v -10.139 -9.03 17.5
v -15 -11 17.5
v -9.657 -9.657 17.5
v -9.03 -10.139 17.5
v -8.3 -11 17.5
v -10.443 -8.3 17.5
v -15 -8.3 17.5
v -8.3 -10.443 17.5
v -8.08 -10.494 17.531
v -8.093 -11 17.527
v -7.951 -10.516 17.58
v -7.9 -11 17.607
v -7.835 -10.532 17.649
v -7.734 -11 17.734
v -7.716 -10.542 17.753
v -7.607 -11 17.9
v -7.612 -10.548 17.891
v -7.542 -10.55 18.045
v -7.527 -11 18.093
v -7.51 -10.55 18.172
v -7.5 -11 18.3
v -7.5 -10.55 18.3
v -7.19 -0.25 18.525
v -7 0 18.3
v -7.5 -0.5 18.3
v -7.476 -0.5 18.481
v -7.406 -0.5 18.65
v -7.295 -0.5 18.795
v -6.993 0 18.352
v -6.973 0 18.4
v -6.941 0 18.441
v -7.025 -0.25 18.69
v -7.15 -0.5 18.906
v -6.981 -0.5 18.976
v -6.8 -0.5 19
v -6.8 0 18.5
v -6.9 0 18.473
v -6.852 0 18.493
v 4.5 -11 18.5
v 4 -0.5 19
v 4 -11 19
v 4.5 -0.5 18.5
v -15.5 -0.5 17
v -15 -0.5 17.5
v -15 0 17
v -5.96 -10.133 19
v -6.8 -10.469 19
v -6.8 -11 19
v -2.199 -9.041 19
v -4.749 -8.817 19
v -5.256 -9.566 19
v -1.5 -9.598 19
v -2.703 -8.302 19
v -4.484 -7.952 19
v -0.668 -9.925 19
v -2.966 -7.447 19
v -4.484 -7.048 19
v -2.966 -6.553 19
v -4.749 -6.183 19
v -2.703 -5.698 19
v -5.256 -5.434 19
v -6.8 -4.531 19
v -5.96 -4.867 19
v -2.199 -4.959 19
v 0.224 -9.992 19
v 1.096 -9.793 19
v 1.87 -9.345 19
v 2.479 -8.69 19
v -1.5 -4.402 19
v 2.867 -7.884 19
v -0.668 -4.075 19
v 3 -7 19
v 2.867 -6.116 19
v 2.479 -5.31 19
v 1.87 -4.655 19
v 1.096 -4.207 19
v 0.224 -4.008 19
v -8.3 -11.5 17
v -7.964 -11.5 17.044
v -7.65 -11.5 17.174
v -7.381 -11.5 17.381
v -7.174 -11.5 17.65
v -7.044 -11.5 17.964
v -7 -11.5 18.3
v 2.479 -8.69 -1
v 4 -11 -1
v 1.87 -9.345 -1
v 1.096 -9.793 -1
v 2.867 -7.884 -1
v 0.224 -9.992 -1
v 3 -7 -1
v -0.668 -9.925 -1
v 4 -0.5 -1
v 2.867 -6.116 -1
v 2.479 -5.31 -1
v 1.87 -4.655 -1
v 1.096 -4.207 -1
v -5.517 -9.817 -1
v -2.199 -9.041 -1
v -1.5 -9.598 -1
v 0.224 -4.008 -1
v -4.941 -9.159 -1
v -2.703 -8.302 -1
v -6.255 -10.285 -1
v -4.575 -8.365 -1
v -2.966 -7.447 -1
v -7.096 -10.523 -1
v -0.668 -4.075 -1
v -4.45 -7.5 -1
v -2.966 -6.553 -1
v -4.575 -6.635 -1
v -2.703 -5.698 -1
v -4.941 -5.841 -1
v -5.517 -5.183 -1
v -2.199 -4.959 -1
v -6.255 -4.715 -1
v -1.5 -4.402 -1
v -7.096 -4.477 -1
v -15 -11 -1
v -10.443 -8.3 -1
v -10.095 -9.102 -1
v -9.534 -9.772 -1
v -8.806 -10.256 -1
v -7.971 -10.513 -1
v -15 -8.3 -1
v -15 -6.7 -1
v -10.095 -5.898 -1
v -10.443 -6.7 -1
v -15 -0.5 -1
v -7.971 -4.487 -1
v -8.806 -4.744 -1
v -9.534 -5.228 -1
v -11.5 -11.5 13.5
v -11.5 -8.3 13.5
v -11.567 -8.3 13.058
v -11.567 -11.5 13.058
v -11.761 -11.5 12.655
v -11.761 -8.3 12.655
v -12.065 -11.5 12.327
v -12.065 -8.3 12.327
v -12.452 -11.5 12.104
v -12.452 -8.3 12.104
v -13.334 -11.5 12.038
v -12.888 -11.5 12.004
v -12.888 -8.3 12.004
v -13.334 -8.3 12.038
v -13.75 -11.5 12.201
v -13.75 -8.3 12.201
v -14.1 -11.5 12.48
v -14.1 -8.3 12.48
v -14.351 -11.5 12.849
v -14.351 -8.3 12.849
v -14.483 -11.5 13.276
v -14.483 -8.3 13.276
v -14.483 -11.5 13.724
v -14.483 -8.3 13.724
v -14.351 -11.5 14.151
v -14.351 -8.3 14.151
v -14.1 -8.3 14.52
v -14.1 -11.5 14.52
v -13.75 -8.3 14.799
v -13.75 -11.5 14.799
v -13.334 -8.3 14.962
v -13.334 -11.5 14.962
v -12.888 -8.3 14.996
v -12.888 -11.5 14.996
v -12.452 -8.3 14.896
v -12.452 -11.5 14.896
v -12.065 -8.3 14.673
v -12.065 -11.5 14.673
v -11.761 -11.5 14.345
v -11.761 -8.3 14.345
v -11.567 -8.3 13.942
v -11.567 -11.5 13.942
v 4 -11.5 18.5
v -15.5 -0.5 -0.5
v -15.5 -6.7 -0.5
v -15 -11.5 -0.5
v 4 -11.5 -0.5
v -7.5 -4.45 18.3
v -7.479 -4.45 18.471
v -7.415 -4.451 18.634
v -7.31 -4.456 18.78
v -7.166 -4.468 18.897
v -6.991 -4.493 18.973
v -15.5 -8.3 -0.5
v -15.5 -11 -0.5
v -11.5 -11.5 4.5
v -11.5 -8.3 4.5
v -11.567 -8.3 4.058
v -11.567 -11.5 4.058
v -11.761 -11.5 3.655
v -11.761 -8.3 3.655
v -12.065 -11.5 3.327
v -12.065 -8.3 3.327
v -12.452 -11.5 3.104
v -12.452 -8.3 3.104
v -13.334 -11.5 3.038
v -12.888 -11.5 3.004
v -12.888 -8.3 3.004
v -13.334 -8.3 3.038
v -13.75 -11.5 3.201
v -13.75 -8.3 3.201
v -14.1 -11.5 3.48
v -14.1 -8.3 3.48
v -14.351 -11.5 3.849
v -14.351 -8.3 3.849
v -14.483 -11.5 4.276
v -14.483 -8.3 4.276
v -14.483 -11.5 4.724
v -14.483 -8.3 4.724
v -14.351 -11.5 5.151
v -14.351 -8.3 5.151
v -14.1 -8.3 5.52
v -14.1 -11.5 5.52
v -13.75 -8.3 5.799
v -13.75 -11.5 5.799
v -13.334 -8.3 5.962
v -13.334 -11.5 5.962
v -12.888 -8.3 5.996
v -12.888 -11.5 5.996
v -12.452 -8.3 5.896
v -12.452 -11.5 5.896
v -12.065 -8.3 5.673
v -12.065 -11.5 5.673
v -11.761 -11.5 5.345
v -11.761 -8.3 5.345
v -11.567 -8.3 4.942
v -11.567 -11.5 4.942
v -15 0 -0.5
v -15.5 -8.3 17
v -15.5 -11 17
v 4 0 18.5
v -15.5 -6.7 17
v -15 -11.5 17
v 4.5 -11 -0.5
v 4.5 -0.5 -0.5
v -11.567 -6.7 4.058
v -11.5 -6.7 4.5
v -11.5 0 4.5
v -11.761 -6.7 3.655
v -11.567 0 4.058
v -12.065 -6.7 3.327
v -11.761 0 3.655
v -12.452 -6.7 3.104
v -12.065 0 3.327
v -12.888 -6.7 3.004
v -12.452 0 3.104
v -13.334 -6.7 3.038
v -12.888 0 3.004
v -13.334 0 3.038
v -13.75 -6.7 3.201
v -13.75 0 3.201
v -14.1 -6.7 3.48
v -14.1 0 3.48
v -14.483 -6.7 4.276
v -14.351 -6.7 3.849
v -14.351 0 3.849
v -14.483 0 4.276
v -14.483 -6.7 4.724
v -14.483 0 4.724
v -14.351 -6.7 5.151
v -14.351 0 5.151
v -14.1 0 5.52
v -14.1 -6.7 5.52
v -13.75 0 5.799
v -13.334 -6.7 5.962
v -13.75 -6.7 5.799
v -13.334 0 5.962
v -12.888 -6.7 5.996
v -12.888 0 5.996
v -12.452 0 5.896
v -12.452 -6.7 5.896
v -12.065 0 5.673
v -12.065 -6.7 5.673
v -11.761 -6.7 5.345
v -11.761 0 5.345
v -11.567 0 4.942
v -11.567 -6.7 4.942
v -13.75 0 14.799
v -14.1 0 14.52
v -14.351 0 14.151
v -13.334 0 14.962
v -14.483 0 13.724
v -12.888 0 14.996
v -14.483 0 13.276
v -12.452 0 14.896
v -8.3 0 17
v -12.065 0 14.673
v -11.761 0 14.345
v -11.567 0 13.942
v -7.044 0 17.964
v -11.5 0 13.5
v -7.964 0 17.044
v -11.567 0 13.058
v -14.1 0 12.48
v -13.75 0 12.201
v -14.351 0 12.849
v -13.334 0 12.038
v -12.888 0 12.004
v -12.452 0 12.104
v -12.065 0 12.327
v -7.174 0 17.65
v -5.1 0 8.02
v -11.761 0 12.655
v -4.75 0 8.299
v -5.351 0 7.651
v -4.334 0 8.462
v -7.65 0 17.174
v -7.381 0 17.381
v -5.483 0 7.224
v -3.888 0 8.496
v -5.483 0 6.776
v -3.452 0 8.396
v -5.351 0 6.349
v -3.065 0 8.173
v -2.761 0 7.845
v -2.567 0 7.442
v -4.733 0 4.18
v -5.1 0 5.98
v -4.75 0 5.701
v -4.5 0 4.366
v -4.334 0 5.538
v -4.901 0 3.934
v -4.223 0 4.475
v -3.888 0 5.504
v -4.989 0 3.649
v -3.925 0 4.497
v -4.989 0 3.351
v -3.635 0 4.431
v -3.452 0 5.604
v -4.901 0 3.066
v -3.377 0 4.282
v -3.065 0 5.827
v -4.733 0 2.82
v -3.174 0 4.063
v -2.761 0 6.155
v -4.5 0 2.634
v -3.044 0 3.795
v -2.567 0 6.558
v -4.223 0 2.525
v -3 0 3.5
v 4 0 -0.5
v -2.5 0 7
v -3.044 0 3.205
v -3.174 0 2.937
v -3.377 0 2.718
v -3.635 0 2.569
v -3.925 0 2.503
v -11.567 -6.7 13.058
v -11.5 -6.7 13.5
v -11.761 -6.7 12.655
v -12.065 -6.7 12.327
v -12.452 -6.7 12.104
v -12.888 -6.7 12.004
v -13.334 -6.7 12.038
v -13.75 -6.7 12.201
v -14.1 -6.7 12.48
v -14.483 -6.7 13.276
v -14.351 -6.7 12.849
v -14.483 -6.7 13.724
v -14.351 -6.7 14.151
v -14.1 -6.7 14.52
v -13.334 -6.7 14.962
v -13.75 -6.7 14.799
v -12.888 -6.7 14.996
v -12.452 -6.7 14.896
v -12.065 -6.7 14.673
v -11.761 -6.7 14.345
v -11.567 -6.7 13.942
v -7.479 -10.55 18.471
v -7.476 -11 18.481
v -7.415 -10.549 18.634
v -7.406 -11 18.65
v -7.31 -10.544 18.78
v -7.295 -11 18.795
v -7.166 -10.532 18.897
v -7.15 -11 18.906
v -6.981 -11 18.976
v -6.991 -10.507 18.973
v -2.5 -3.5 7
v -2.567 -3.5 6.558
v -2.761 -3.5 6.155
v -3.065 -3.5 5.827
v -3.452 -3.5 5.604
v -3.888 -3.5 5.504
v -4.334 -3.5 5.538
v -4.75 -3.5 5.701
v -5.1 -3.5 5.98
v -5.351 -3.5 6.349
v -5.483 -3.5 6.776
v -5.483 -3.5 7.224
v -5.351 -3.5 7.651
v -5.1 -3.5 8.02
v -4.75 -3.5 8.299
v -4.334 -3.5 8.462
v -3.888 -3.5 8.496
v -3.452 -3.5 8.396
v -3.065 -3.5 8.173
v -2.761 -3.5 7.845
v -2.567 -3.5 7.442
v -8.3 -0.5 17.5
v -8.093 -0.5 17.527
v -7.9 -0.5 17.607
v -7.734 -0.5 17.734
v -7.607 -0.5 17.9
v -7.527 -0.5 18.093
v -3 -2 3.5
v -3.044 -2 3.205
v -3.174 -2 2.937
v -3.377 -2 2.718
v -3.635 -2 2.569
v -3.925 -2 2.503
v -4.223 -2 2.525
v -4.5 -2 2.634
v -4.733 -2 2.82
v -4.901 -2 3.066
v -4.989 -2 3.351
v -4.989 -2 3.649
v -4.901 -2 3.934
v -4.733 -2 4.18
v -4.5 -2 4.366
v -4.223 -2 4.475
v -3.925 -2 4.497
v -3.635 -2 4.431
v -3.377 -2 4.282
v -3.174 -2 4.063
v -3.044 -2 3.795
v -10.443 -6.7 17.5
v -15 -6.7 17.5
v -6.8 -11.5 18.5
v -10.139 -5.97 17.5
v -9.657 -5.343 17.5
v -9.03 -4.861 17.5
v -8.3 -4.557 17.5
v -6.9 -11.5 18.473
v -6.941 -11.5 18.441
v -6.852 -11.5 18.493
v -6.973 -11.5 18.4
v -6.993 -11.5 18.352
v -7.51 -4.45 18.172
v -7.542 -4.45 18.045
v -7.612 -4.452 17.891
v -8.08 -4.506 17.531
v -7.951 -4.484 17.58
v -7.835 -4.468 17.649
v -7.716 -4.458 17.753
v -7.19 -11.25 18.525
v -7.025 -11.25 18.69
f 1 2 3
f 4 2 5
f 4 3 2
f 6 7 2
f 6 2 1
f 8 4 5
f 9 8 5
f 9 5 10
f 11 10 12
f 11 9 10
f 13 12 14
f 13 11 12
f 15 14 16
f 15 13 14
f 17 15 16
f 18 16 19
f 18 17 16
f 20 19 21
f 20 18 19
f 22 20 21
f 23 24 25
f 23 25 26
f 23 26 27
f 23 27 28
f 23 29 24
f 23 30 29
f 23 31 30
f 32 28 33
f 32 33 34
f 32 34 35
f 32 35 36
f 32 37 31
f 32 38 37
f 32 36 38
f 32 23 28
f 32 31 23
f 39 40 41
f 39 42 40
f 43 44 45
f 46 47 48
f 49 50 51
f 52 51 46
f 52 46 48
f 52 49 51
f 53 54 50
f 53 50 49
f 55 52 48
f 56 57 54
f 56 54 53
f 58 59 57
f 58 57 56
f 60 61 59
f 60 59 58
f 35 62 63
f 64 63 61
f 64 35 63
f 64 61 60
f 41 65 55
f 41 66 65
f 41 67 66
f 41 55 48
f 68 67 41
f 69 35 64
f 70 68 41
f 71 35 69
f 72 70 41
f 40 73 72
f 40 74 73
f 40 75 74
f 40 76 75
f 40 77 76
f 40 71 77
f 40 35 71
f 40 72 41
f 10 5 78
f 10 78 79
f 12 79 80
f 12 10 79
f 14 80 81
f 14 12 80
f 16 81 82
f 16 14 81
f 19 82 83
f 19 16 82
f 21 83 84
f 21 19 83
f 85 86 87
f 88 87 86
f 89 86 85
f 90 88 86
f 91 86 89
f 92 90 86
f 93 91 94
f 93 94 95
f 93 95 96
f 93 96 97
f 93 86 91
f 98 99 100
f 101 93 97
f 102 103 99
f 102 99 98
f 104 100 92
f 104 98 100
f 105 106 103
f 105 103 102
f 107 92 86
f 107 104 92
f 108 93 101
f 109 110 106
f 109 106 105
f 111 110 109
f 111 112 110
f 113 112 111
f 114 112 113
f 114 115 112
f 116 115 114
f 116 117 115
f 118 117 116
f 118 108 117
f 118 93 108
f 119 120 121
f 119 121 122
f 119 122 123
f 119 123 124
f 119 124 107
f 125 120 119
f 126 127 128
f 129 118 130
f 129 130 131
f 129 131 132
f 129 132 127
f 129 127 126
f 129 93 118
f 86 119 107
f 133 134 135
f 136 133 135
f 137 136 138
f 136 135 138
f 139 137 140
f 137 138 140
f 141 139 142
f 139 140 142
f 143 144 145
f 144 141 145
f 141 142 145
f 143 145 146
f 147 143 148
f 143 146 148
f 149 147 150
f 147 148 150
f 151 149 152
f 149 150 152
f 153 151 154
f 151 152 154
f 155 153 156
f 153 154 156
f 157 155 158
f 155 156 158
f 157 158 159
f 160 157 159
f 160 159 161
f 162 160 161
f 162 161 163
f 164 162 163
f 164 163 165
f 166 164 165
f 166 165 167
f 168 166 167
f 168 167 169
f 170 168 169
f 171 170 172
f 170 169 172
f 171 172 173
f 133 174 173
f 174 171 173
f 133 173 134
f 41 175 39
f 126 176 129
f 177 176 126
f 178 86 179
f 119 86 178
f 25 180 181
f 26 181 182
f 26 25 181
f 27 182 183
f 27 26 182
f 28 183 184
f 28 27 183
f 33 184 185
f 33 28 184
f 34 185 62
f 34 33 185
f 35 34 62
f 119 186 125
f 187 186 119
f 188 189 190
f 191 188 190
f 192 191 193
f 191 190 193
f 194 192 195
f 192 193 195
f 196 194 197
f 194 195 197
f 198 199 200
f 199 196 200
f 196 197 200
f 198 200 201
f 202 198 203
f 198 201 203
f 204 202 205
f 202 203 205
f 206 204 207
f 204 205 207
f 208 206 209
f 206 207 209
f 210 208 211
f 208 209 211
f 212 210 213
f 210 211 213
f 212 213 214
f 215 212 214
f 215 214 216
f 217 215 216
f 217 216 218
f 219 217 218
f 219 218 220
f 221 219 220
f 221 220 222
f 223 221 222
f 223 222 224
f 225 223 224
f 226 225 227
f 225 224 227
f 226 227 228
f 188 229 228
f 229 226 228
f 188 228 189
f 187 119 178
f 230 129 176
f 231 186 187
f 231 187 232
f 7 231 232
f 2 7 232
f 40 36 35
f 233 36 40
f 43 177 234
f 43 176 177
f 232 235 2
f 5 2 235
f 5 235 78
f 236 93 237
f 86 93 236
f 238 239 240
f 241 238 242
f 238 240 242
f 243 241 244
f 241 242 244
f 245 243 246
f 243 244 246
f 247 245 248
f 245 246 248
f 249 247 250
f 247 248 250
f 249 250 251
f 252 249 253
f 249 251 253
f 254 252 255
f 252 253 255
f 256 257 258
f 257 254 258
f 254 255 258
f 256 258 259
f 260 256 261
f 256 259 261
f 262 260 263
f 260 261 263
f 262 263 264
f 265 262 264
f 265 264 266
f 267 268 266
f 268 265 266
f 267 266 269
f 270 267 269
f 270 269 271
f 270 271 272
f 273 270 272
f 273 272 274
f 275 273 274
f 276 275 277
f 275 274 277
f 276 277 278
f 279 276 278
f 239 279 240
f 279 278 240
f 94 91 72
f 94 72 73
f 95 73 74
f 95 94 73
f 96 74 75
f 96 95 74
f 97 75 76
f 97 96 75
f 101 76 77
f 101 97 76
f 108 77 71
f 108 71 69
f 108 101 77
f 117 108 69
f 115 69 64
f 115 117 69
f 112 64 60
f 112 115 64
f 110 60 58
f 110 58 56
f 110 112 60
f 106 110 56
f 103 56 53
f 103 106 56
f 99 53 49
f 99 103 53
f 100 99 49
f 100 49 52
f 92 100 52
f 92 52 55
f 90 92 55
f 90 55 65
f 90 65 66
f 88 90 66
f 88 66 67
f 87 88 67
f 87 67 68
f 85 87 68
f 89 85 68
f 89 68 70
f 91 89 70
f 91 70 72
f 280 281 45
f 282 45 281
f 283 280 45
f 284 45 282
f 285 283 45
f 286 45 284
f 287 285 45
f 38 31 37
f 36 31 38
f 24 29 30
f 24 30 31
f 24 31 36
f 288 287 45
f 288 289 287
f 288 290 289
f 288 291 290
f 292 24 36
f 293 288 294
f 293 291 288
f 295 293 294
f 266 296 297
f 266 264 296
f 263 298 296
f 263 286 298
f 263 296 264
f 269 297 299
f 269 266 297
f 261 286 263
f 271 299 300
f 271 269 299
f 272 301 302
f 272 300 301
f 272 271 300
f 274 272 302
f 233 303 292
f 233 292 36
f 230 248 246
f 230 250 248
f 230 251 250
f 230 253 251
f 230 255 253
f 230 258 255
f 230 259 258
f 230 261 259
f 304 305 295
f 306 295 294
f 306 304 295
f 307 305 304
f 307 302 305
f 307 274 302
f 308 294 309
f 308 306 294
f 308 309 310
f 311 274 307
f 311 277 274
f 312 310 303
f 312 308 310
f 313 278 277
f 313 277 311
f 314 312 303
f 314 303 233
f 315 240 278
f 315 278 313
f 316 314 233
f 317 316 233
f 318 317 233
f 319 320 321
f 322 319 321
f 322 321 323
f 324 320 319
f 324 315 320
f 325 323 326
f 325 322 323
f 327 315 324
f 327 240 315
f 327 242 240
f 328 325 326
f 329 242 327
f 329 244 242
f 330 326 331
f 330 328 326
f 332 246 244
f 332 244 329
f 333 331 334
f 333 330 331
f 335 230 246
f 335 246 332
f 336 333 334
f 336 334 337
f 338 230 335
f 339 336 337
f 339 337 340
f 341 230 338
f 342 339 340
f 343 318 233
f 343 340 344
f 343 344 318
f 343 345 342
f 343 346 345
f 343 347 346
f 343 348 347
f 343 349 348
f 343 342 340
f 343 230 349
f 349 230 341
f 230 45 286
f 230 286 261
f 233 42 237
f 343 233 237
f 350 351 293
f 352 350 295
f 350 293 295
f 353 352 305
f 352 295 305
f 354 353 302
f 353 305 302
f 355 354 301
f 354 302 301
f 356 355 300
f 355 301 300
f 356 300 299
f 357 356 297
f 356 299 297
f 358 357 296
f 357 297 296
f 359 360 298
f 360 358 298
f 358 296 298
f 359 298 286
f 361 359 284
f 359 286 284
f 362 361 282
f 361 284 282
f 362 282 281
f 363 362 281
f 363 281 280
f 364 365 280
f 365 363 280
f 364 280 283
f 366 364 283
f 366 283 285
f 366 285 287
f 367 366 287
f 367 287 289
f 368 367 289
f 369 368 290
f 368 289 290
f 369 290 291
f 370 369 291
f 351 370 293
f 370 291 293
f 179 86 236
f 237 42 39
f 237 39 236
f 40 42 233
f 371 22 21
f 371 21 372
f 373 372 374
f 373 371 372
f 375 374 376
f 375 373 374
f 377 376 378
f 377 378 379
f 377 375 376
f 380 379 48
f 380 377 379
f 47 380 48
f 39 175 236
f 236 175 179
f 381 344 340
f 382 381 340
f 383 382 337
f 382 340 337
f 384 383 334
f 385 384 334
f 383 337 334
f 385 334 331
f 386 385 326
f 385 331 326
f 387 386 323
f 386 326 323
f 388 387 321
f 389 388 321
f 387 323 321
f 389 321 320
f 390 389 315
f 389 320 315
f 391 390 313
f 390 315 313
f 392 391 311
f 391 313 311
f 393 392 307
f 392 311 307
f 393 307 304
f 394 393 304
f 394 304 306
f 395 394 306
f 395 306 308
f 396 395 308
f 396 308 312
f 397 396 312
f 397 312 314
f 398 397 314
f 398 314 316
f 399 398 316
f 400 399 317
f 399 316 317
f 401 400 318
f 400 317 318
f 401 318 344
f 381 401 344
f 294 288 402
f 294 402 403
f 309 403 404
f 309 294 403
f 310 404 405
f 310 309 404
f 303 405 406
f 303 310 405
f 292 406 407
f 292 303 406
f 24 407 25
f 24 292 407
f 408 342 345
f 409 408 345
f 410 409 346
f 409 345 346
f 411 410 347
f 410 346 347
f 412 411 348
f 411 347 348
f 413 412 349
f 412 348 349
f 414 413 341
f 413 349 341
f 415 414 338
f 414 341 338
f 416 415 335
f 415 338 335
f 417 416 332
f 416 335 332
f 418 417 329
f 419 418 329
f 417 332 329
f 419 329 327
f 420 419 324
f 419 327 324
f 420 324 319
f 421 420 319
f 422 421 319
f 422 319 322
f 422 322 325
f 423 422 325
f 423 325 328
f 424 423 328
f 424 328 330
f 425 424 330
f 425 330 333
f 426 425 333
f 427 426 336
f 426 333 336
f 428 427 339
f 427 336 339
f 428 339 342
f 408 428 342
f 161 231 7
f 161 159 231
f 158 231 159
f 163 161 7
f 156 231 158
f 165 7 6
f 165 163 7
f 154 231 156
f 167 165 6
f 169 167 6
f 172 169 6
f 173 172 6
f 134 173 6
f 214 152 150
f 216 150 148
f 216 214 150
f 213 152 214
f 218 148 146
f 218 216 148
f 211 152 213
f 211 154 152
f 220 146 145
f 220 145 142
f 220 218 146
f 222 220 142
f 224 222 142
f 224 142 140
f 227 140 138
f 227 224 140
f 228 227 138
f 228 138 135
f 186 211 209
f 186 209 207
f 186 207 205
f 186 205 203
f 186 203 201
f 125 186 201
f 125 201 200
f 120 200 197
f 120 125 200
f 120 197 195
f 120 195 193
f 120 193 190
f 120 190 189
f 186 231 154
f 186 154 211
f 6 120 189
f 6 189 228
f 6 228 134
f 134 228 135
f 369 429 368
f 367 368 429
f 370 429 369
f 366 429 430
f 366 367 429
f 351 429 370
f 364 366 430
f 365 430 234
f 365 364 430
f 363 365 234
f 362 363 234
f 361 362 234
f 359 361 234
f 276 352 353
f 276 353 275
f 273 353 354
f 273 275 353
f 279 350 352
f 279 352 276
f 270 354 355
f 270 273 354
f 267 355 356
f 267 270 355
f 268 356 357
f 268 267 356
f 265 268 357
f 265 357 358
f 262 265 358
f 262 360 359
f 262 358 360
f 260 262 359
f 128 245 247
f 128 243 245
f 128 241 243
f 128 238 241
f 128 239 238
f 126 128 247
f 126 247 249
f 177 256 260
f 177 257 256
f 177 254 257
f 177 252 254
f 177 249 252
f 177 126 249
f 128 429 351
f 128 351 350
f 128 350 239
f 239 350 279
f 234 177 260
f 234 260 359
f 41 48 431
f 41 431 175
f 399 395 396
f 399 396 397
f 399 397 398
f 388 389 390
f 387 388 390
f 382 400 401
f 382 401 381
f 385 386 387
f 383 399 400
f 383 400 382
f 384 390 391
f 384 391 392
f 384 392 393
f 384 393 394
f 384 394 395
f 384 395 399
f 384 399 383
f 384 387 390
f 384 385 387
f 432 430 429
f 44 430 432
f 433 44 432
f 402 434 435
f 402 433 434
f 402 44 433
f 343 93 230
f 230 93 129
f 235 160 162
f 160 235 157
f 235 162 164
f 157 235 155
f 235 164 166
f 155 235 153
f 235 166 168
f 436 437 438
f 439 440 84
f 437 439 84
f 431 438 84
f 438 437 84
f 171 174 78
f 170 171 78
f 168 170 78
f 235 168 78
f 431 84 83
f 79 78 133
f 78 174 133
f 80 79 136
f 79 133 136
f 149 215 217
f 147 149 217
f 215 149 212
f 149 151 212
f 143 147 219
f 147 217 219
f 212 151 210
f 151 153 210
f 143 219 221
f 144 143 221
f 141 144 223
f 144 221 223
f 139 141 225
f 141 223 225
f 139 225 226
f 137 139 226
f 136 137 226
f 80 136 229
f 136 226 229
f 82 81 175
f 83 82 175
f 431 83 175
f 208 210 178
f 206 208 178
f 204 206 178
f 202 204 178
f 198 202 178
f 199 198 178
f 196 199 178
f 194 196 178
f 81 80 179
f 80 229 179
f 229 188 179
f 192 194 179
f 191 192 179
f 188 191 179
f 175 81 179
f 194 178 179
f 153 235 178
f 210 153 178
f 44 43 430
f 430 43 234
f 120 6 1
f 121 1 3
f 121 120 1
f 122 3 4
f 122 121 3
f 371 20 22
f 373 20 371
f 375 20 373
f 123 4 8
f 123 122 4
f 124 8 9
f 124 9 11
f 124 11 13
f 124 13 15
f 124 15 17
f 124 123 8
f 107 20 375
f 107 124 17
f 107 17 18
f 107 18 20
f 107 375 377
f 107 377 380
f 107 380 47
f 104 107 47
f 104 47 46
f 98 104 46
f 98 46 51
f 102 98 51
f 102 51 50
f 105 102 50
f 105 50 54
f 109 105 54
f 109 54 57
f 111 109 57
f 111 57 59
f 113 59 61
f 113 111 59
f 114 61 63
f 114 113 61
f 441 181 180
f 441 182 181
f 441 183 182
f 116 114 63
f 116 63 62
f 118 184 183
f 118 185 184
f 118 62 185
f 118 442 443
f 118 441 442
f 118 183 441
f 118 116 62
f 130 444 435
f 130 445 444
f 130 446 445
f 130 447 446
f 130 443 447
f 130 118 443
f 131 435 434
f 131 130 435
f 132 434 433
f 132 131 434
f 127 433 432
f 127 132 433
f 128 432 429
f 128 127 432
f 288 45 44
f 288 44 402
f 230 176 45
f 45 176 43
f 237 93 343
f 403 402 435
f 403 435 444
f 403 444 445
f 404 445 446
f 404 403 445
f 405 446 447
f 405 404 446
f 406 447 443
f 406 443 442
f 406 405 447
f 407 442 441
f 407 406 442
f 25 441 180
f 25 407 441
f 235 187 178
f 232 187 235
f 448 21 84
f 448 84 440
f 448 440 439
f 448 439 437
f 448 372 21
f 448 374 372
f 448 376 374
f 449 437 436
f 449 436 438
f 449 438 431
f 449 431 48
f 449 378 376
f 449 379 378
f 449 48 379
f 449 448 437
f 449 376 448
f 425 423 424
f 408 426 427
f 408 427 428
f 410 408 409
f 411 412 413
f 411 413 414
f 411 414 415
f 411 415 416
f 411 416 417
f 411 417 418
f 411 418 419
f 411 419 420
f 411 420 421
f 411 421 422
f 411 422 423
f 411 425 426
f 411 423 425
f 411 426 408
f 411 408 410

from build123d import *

# Parameters (mm, degrees)
F0_R      = 1.5
F0_R_2    = 1
F0_R_3    = 1.2
F1_DEPTH  = 11.5
F2_R      = 3
F2_R_2    = 2.4
F3_DEPTH  = 25
F4_DEPTH  = 25
F5_DEPTH  = 3.5
F6_DEPTH  = 2
F7_SIZE   = 0.5
F10_ANGLE = 180


with BuildPart() as f1:
    # F0 (on Front) → F1 (new body)
    with BuildSketch(Plane.XZ):
        with BuildLine():
            Line((-6.8, -20), (4.5, -20))
            Line((4.5, -20), (4.5, 0))
            Line((4.5, 0), (-15.5, 0))
            Line((-15.5, 0), (-15.5, -18.5))
            Line((-15.5, -18.5), (-8.3, -18.5))
            ThreePointArc((-8.3, -18.5), (-7.7343145751, -18.7343145751), (-7.5, -19.3))
            ThreePointArc((-7.5, -19.3), (-7.2949747468, -19.7949747468), (-6.8, -20))
        make_face()
        with Locations((-13, -14.5)):
            Circle(F0_R, mode=Mode.SUBTRACT)
        with Locations((-13, -5.5)):
            Circle(F0_R, mode=Mode.SUBTRACT)
        with Locations((-4, -8)):
            Circle(F0_R, mode=Mode.SUBTRACT)
        with Locations((-4, -4.5)):
            Circle(F0_R_2, mode=Mode.SUBTRACT)
        with Locations((-4, -8)):
            Circle(F0_R)
        with Locations((-4, -8)):
            Circle(F0_R_3, mode=Mode.SUBTRACT)
        with Locations((-13, -5.5)):
            Circle(F0_R)
        with Locations((-13, -5.5)):
            Circle(F0_R_3, mode=Mode.SUBTRACT)
        with Locations((-13, -14.5)):
            Circle(F0_R)
        with Locations((-13, -14.5)):
            Circle(F0_R_3, mode=Mode.SUBTRACT)
        with Locations((-4, -8)):
            Circle(F0_R_3)
        with Locations((-13, -5.5)):
            Circle(F0_R_3)
        with Locations((-13, -14.5)):
            Circle(F0_R_3)
        with Locations((-4, -4.5)):
            Circle(F0_R_2)
    extrude(amount=F1_DEPTH)

    # F2 (on Top) → F3 (cut)
    with BuildSketch(Plane.XY):
        with BuildLine():
            Line((-10.4432125306, -6.7), (-15.5, -6.7))
            Line((-15.5, -6.7), (-15.5, -8.3))
            Line((-15.5, -8.3), (-10.4432125306, -8.3))
            ThreePointArc((-10.4432125306, -8.3), (-4.45, -7.5), (-10.4432125306, -6.7))
        make_face()
        with Locations((0, -7)):
            Circle(F2_R)
        with Locations((0, -7)):
            Circle(F2_R_2, mode=Mode.SUBTRACT)
        with Locations((0, -7)):
            Circle(F2_R_2)
    extrude(amount=-F3_DEPTH, mode=Mode.SUBTRACT)

    # F0 (on Front) → F4 (cut)
    with BuildSketch(Plane.XZ):
        with Locations((-13, -5.5)):
            Circle(F0_R)
        with Locations((-13, -5.5)):
            Circle(F0_R_3, mode=Mode.SUBTRACT)
        with Locations((-13, -14.5)):
            Circle(F0_R)
        with Locations((-13, -14.5)):
            Circle(F0_R_3, mode=Mode.SUBTRACT)
        with Locations((-13, -5.5)):
            Circle(F0_R_3)
        with Locations((-13, -14.5)):
            Circle(F0_R_3)
    extrude(amount=F4_DEPTH, mode=Mode.SUBTRACT)

    # F0 (on Front) → F5 (cut)
    with BuildSketch(Plane.XZ):
        with Locations((-4, -8)):
            Circle(F0_R)
        with Locations((-4, -8)):
            Circle(F0_R_3, mode=Mode.SUBTRACT)
        with Locations((-4, -8)):
            Circle(F0_R_3)
    extrude(amount=F5_DEPTH, mode=Mode.SUBTRACT)

    # F0 (on Front) → F6 (cut)
    with BuildSketch(Plane.XZ):
        with Locations((-4, -4.5)):
            Circle(F0_R_2)
    extrude(amount=F6_DEPTH, mode=Mode.SUBTRACT)

    # F7
    f7_edges = [f1.edges().sort_by_distance(p)[0] for p in [
        (4.5, -5.75, 0),
        (-5.5, -11.5, 0),
        (-15.5, -9.9, 0),
        (-15.5, -3.35, 0),
        (-5.5, 0, 0),
        (4.5, -11.5, -10),
        (-15.5, -11.5, -9.25),
        (-11.9, -11.5, -18.5),
        (-7.734315, -11.5, -18.734315),
        (-7.294975, -11.5, -19.794975),
        (-1.15, -11.5, -20),
        (4.5, -5.75, -20),
        (-15.5, -9.9, -18.5),
        (-15.5, -3.35, -18.5),
        (4.5, 0, -10),
        (-1.15, 0, -20),
        (-7.294975, 0, -19.794975),
        (-7.734315, 0, -18.734315),
        (-11.9, 0, -18.5),
        (-15.5, 0, -9.25),
    ]]
    chamfer(f7_edges, length=F7_SIZE)


with BuildPart() as f8_1:
    # F8: instance of F1
    add(f1.part.mirror(Plane.XZ))


with BuildPart() as f8_1_1:
    # F10: moved
    add(f8_1.part.rotate(Axis((-5.5, 0, -0.5), (1, 0, 0)), F10_ANGLE))


solid = f8_1_1.part
